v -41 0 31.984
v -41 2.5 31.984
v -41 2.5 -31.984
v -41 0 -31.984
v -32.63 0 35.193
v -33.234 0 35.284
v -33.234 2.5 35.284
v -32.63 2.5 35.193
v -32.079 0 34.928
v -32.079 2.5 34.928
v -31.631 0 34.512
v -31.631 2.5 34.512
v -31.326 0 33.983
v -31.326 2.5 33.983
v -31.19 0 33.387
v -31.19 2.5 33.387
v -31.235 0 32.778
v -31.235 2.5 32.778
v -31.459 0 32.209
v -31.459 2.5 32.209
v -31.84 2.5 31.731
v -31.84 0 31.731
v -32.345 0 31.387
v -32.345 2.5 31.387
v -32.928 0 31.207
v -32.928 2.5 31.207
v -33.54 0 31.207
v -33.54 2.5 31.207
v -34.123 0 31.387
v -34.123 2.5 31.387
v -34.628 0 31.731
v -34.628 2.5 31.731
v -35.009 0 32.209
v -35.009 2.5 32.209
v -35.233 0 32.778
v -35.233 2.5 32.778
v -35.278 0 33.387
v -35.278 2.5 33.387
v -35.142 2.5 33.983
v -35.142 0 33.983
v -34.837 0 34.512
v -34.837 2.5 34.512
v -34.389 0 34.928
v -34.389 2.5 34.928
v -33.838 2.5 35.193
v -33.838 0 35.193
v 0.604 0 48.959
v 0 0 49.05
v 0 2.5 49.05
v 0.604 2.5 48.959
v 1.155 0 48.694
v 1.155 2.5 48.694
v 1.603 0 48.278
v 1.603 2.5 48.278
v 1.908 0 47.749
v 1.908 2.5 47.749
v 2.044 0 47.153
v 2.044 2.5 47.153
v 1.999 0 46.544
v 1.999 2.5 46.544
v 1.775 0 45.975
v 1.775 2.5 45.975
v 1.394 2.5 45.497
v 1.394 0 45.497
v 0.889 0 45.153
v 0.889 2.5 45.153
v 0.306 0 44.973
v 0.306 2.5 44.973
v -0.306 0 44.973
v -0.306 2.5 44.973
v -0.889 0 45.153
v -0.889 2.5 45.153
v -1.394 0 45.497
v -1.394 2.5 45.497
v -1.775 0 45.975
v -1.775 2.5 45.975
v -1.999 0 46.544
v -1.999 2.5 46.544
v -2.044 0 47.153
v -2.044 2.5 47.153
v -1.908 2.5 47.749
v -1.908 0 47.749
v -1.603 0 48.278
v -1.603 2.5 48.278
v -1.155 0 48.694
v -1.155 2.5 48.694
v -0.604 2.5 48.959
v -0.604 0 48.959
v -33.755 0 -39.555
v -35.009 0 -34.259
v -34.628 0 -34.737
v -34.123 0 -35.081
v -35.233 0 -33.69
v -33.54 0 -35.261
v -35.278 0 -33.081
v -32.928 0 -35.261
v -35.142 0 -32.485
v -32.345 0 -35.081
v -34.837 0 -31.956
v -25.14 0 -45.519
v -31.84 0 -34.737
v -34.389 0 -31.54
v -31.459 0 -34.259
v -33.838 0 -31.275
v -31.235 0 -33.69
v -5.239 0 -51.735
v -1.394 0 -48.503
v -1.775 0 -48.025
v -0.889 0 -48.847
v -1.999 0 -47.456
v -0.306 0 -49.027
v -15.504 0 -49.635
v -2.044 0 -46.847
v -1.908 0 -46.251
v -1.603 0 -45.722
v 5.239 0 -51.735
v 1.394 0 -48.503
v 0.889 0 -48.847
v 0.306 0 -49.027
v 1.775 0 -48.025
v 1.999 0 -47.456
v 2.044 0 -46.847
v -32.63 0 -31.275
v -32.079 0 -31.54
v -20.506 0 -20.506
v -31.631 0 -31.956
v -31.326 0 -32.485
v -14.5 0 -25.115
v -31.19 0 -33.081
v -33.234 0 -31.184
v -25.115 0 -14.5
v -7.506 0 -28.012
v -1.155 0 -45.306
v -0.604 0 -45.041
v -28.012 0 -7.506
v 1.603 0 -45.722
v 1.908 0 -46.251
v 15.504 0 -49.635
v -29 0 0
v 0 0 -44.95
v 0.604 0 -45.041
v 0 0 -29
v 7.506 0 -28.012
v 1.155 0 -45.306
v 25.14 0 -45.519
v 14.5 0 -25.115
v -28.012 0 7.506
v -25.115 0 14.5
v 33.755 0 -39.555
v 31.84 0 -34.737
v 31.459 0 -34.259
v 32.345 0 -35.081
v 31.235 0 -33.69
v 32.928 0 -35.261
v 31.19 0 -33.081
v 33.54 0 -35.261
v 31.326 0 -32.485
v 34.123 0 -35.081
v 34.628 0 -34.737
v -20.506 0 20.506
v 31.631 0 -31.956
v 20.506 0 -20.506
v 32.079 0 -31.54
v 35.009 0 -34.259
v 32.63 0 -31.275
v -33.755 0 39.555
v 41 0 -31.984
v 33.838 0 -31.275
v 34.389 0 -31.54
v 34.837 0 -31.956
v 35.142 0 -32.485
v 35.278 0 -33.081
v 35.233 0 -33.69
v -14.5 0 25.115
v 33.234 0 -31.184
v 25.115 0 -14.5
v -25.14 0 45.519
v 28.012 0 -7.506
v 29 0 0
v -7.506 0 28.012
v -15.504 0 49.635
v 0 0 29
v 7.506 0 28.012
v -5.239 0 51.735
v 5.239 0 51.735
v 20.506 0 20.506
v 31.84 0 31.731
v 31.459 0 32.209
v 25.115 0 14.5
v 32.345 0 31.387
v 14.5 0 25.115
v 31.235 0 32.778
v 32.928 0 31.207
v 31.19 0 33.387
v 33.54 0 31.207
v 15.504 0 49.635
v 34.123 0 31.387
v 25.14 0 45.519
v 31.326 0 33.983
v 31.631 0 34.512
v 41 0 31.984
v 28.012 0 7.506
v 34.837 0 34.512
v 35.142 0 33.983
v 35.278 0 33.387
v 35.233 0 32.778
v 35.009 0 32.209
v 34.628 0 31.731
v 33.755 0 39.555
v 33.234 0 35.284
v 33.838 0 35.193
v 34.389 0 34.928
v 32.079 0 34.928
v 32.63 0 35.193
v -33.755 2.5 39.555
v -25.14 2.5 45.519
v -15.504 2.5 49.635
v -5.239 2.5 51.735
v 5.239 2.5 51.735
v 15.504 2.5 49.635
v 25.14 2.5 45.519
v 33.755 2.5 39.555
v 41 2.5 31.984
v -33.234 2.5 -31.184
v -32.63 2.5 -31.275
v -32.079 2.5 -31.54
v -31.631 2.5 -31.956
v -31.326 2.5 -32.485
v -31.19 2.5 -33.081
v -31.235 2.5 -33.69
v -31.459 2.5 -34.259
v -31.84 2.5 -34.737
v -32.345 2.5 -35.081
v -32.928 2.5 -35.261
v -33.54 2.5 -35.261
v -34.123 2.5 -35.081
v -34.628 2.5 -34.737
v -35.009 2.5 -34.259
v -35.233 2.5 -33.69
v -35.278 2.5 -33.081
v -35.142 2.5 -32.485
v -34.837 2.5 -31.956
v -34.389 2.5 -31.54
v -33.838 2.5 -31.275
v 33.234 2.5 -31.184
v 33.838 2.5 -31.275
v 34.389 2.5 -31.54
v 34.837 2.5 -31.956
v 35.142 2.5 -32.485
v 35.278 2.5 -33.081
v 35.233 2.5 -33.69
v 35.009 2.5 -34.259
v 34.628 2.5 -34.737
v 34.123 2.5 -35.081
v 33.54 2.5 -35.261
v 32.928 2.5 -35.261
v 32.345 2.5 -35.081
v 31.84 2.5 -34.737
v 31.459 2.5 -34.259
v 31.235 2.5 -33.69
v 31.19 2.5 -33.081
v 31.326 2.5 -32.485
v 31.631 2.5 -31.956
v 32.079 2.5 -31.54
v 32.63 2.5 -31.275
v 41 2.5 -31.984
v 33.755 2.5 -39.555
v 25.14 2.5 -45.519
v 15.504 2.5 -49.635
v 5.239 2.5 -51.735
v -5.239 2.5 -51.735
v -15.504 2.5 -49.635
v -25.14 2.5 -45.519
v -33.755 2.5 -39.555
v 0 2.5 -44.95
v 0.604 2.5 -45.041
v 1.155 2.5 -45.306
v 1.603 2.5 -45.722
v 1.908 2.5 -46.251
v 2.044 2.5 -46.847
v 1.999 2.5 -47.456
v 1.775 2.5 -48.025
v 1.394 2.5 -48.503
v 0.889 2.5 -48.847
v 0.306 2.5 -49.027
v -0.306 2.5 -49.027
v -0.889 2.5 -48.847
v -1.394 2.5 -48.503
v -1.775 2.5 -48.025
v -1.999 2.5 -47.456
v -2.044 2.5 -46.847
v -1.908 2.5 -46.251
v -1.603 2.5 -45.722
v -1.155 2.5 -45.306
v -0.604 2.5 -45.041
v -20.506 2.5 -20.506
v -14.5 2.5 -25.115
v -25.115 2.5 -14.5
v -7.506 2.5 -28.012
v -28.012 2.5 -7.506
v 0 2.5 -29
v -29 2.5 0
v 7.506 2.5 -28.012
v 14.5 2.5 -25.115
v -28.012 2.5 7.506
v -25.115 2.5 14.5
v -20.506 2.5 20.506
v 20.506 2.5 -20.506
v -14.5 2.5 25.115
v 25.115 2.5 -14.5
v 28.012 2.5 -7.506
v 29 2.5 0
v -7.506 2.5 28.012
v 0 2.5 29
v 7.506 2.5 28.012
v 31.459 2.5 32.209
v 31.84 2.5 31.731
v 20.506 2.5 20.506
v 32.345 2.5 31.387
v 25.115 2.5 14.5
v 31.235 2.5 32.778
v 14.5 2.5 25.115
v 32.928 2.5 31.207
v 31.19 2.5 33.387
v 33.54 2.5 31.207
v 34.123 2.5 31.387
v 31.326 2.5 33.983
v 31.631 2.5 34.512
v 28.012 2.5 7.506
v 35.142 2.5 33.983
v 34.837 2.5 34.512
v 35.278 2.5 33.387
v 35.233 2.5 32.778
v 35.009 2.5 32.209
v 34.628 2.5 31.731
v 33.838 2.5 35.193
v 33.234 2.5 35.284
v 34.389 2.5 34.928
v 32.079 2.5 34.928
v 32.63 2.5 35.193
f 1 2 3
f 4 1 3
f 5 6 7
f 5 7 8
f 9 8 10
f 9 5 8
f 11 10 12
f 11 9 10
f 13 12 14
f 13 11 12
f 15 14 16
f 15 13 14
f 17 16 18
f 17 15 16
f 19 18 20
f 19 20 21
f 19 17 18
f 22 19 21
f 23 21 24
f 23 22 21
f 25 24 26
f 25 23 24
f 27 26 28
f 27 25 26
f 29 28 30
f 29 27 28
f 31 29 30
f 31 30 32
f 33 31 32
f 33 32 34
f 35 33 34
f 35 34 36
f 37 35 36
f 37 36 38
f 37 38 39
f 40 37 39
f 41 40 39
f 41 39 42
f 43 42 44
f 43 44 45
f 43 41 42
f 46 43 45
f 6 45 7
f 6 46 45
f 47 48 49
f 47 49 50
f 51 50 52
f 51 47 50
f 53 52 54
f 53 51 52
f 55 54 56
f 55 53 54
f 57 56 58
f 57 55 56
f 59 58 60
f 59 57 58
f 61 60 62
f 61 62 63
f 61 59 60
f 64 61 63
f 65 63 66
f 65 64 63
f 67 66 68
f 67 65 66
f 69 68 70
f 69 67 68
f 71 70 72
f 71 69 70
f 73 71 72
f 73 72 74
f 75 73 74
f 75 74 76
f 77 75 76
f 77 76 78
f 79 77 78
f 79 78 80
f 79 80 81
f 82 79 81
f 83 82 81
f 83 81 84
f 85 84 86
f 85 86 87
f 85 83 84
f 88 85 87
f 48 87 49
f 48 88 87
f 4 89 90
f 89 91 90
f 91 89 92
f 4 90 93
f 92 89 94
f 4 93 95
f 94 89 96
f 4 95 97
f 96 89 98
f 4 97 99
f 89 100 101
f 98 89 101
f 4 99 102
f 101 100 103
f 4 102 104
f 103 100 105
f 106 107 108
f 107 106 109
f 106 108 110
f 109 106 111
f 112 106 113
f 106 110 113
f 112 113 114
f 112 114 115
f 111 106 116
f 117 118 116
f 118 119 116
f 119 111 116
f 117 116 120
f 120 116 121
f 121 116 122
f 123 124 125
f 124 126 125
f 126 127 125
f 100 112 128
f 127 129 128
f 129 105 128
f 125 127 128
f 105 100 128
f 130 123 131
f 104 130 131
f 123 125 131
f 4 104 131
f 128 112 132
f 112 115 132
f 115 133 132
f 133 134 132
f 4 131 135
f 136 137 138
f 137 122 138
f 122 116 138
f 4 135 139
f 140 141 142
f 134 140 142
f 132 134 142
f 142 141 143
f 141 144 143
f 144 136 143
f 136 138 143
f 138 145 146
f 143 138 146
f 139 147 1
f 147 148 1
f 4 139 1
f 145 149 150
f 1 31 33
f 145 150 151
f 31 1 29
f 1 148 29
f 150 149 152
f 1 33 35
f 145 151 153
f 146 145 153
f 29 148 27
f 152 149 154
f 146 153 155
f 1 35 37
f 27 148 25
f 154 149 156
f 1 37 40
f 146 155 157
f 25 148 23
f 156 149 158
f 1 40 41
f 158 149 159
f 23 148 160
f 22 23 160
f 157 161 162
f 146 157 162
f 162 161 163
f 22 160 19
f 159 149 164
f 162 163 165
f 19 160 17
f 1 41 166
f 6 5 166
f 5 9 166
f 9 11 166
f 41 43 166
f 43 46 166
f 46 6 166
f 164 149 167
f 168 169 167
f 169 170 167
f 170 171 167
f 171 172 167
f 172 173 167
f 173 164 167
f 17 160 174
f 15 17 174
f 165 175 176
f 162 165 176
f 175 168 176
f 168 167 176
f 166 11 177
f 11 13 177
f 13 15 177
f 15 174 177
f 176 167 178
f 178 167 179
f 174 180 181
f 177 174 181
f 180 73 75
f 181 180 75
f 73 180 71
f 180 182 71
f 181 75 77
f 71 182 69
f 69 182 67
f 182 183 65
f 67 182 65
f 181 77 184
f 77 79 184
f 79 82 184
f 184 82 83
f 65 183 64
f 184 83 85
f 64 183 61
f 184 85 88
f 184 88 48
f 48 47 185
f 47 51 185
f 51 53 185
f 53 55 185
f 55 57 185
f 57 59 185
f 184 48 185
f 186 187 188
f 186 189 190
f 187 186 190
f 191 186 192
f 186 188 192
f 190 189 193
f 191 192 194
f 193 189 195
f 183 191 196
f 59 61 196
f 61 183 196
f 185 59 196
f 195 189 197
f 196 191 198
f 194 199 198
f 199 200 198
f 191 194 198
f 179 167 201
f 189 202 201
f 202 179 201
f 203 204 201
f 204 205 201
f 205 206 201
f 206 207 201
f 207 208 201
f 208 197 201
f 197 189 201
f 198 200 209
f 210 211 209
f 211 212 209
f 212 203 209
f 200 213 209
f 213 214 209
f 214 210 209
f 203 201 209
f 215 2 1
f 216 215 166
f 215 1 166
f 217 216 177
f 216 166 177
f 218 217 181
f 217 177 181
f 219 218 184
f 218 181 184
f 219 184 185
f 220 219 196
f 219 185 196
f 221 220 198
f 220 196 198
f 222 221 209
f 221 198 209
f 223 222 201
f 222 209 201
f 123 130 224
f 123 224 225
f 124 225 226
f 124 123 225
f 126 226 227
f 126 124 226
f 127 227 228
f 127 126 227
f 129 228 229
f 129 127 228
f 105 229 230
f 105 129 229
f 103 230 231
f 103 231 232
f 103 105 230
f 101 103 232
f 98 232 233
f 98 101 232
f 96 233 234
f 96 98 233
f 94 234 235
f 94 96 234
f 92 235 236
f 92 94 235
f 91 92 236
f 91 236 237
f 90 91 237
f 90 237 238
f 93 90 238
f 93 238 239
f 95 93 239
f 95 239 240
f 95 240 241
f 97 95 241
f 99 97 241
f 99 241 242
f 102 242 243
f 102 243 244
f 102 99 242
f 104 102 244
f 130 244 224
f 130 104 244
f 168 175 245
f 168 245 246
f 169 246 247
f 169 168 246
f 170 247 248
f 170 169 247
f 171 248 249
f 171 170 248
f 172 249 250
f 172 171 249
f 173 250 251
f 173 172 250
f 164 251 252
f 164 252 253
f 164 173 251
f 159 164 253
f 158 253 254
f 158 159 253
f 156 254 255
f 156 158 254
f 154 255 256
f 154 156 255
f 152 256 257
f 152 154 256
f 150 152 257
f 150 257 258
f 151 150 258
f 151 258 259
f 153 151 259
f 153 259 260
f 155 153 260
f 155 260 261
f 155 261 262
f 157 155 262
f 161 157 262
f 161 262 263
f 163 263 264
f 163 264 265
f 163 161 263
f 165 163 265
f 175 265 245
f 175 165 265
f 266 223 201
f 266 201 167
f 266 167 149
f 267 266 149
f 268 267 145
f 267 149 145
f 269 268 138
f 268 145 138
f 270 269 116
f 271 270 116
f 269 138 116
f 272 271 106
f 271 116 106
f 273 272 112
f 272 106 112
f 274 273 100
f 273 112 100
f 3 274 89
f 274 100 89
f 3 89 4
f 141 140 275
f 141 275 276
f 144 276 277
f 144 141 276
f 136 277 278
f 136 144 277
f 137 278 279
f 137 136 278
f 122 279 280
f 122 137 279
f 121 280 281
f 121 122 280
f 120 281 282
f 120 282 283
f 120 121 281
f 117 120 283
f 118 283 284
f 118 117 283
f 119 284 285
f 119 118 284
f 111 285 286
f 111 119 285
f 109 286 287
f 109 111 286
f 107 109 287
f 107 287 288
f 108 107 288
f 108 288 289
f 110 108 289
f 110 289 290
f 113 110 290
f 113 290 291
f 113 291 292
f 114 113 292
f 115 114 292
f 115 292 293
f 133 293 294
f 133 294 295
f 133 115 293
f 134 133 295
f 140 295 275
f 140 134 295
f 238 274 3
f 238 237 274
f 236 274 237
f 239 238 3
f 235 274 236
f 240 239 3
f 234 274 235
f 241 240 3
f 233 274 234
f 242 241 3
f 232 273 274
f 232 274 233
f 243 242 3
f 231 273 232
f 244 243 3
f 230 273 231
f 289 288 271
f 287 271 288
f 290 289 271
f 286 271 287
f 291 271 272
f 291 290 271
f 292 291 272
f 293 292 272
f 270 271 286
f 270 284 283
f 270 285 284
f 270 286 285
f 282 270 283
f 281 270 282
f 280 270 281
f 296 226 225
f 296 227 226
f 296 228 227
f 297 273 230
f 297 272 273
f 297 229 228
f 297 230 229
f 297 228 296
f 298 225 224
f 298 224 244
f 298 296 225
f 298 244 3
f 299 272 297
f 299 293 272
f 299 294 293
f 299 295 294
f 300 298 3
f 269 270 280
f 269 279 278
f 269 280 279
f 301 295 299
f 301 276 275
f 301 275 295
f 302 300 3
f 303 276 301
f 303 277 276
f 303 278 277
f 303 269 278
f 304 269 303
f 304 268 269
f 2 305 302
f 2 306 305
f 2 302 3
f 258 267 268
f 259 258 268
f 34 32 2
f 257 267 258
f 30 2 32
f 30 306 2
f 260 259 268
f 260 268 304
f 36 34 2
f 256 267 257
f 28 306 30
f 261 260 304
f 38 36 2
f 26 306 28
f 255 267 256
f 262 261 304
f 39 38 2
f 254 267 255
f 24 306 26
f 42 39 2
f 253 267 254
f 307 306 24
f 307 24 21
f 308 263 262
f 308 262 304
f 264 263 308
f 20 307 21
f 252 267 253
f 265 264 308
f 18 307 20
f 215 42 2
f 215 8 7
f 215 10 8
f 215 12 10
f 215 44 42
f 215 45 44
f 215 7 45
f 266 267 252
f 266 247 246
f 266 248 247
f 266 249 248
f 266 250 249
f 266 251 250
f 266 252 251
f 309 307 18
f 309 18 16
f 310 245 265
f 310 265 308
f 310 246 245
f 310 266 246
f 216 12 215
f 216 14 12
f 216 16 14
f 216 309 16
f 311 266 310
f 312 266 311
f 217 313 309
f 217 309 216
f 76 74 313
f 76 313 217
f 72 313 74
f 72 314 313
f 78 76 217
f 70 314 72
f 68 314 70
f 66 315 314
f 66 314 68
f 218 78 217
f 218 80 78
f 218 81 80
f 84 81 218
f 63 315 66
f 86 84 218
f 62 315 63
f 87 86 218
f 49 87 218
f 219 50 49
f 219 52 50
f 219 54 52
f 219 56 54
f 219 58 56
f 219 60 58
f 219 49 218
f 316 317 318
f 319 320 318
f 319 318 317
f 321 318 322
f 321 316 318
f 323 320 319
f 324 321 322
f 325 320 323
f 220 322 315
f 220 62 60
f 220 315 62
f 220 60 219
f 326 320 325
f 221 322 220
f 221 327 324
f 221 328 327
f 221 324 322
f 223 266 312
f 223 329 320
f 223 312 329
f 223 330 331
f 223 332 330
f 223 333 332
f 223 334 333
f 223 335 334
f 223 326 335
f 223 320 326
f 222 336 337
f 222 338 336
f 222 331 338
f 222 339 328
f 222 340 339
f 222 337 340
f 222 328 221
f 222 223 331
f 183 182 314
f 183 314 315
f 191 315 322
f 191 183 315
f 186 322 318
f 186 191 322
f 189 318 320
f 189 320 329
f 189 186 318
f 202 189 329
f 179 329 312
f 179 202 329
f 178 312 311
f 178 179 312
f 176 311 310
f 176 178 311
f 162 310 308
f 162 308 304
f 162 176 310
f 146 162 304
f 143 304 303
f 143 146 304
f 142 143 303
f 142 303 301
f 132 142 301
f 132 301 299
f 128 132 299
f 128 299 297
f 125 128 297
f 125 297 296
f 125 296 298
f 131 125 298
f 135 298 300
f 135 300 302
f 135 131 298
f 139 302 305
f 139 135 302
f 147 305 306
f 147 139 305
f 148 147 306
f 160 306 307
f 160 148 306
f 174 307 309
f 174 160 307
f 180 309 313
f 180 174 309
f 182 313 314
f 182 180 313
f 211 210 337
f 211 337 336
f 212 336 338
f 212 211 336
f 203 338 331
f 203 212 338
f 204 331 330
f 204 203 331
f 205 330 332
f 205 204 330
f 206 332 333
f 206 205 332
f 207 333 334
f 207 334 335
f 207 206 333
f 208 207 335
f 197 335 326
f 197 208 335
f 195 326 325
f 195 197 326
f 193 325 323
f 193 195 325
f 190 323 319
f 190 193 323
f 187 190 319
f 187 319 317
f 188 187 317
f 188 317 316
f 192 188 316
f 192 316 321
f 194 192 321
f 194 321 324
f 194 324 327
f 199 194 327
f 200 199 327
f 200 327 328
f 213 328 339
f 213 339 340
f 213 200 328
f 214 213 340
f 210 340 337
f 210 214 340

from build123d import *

# Parameters (mm, degrees)
SKETCH_1_R          = 52
SKETCH_1_R_2        = 29
SKETCH_1_R_3        = 2.05
EXTRUDE_1_DEPTH     = 2.5
SKETCH_2_W          = 182
SKETCH_2_H          = 210.035227354
SKETCH_2_W_2        = 82
SKETCH_2_H_2        = 110.035227354
CUT_EXTRUDE_1_DEPTH = 4


with BuildPart() as part:
    # 草图1 → 凸台-拉伸1 (new body)
    with BuildSketch(Plane(origin=(0, 0, 0), x_dir=(1, 0, 0), z_dir=(0, 1, 0))):
        with Locations(Location((0, 0, 0), (0, 0, 270))):
            Circle(SKETCH_1_R)
        with Locations(Location((0, 0, 0), (0, 0, 270))):
            Circle(SKETCH_1_R_2, mode=Mode.SUBTRACT)
        with Locations(Location((47, 0, 0), (0, 0, 270))):
            Circle(SKETCH_1_R_3, mode=Mode.SUBTRACT)
        with Locations(Location((33.234018716, -33.234018716, 0), (0, 0, 270))):
            Circle(SKETCH_1_R_3, mode=Mode.SUBTRACT)
        with Locations(Location((0, -47, 0), (0, 0, 270))):
            Circle(SKETCH_1_R_3, mode=Mode.SUBTRACT)
        with Locations(Location((-33.234018716, -33.234018716, 0), (0, 0, 270))):
            Circle(SKETCH_1_R_3, mode=Mode.SUBTRACT)
        with Locations(Location((-47, 0, 0), (0, 0, 270))):
            Circle(SKETCH_1_R_3, mode=Mode.SUBTRACT)
        with Locations(Location((-33.234018716, 33.234018716, 0), (0, 0, 270))):
            Circle(SKETCH_1_R_3, mode=Mode.SUBTRACT)
        with Locations(Location((0, 47, 0), (0, 0, 270))):
            Circle(SKETCH_1_R_3, mode=Mode.SUBTRACT)
        with Locations(Location((33.234018716, 33.234018716, 0), (0, 0, 270))):
            Circle(SKETCH_1_R_3, mode=Mode.SUBTRACT)
    extrude(amount=EXTRUDE_1_DEPTH)

    # 草图2 → 切除-拉伸-薄壁1 (cut)
    with BuildSketch(Plane(origin=(0, 2.5, 0), x_dir=(1, 0, 0), z_dir=(0, 1, 0))):
        Rectangle(SKETCH_2_W, SKETCH_2_H)
        Rectangle(SKETCH_2_W_2, SKETCH_2_H_2, mode=Mode.SUBTRACT)
    extrude(amount=-CUT_EXTRUDE_1_DEPTH, mode=Mode.SUBTRACT)


solid = part.part
